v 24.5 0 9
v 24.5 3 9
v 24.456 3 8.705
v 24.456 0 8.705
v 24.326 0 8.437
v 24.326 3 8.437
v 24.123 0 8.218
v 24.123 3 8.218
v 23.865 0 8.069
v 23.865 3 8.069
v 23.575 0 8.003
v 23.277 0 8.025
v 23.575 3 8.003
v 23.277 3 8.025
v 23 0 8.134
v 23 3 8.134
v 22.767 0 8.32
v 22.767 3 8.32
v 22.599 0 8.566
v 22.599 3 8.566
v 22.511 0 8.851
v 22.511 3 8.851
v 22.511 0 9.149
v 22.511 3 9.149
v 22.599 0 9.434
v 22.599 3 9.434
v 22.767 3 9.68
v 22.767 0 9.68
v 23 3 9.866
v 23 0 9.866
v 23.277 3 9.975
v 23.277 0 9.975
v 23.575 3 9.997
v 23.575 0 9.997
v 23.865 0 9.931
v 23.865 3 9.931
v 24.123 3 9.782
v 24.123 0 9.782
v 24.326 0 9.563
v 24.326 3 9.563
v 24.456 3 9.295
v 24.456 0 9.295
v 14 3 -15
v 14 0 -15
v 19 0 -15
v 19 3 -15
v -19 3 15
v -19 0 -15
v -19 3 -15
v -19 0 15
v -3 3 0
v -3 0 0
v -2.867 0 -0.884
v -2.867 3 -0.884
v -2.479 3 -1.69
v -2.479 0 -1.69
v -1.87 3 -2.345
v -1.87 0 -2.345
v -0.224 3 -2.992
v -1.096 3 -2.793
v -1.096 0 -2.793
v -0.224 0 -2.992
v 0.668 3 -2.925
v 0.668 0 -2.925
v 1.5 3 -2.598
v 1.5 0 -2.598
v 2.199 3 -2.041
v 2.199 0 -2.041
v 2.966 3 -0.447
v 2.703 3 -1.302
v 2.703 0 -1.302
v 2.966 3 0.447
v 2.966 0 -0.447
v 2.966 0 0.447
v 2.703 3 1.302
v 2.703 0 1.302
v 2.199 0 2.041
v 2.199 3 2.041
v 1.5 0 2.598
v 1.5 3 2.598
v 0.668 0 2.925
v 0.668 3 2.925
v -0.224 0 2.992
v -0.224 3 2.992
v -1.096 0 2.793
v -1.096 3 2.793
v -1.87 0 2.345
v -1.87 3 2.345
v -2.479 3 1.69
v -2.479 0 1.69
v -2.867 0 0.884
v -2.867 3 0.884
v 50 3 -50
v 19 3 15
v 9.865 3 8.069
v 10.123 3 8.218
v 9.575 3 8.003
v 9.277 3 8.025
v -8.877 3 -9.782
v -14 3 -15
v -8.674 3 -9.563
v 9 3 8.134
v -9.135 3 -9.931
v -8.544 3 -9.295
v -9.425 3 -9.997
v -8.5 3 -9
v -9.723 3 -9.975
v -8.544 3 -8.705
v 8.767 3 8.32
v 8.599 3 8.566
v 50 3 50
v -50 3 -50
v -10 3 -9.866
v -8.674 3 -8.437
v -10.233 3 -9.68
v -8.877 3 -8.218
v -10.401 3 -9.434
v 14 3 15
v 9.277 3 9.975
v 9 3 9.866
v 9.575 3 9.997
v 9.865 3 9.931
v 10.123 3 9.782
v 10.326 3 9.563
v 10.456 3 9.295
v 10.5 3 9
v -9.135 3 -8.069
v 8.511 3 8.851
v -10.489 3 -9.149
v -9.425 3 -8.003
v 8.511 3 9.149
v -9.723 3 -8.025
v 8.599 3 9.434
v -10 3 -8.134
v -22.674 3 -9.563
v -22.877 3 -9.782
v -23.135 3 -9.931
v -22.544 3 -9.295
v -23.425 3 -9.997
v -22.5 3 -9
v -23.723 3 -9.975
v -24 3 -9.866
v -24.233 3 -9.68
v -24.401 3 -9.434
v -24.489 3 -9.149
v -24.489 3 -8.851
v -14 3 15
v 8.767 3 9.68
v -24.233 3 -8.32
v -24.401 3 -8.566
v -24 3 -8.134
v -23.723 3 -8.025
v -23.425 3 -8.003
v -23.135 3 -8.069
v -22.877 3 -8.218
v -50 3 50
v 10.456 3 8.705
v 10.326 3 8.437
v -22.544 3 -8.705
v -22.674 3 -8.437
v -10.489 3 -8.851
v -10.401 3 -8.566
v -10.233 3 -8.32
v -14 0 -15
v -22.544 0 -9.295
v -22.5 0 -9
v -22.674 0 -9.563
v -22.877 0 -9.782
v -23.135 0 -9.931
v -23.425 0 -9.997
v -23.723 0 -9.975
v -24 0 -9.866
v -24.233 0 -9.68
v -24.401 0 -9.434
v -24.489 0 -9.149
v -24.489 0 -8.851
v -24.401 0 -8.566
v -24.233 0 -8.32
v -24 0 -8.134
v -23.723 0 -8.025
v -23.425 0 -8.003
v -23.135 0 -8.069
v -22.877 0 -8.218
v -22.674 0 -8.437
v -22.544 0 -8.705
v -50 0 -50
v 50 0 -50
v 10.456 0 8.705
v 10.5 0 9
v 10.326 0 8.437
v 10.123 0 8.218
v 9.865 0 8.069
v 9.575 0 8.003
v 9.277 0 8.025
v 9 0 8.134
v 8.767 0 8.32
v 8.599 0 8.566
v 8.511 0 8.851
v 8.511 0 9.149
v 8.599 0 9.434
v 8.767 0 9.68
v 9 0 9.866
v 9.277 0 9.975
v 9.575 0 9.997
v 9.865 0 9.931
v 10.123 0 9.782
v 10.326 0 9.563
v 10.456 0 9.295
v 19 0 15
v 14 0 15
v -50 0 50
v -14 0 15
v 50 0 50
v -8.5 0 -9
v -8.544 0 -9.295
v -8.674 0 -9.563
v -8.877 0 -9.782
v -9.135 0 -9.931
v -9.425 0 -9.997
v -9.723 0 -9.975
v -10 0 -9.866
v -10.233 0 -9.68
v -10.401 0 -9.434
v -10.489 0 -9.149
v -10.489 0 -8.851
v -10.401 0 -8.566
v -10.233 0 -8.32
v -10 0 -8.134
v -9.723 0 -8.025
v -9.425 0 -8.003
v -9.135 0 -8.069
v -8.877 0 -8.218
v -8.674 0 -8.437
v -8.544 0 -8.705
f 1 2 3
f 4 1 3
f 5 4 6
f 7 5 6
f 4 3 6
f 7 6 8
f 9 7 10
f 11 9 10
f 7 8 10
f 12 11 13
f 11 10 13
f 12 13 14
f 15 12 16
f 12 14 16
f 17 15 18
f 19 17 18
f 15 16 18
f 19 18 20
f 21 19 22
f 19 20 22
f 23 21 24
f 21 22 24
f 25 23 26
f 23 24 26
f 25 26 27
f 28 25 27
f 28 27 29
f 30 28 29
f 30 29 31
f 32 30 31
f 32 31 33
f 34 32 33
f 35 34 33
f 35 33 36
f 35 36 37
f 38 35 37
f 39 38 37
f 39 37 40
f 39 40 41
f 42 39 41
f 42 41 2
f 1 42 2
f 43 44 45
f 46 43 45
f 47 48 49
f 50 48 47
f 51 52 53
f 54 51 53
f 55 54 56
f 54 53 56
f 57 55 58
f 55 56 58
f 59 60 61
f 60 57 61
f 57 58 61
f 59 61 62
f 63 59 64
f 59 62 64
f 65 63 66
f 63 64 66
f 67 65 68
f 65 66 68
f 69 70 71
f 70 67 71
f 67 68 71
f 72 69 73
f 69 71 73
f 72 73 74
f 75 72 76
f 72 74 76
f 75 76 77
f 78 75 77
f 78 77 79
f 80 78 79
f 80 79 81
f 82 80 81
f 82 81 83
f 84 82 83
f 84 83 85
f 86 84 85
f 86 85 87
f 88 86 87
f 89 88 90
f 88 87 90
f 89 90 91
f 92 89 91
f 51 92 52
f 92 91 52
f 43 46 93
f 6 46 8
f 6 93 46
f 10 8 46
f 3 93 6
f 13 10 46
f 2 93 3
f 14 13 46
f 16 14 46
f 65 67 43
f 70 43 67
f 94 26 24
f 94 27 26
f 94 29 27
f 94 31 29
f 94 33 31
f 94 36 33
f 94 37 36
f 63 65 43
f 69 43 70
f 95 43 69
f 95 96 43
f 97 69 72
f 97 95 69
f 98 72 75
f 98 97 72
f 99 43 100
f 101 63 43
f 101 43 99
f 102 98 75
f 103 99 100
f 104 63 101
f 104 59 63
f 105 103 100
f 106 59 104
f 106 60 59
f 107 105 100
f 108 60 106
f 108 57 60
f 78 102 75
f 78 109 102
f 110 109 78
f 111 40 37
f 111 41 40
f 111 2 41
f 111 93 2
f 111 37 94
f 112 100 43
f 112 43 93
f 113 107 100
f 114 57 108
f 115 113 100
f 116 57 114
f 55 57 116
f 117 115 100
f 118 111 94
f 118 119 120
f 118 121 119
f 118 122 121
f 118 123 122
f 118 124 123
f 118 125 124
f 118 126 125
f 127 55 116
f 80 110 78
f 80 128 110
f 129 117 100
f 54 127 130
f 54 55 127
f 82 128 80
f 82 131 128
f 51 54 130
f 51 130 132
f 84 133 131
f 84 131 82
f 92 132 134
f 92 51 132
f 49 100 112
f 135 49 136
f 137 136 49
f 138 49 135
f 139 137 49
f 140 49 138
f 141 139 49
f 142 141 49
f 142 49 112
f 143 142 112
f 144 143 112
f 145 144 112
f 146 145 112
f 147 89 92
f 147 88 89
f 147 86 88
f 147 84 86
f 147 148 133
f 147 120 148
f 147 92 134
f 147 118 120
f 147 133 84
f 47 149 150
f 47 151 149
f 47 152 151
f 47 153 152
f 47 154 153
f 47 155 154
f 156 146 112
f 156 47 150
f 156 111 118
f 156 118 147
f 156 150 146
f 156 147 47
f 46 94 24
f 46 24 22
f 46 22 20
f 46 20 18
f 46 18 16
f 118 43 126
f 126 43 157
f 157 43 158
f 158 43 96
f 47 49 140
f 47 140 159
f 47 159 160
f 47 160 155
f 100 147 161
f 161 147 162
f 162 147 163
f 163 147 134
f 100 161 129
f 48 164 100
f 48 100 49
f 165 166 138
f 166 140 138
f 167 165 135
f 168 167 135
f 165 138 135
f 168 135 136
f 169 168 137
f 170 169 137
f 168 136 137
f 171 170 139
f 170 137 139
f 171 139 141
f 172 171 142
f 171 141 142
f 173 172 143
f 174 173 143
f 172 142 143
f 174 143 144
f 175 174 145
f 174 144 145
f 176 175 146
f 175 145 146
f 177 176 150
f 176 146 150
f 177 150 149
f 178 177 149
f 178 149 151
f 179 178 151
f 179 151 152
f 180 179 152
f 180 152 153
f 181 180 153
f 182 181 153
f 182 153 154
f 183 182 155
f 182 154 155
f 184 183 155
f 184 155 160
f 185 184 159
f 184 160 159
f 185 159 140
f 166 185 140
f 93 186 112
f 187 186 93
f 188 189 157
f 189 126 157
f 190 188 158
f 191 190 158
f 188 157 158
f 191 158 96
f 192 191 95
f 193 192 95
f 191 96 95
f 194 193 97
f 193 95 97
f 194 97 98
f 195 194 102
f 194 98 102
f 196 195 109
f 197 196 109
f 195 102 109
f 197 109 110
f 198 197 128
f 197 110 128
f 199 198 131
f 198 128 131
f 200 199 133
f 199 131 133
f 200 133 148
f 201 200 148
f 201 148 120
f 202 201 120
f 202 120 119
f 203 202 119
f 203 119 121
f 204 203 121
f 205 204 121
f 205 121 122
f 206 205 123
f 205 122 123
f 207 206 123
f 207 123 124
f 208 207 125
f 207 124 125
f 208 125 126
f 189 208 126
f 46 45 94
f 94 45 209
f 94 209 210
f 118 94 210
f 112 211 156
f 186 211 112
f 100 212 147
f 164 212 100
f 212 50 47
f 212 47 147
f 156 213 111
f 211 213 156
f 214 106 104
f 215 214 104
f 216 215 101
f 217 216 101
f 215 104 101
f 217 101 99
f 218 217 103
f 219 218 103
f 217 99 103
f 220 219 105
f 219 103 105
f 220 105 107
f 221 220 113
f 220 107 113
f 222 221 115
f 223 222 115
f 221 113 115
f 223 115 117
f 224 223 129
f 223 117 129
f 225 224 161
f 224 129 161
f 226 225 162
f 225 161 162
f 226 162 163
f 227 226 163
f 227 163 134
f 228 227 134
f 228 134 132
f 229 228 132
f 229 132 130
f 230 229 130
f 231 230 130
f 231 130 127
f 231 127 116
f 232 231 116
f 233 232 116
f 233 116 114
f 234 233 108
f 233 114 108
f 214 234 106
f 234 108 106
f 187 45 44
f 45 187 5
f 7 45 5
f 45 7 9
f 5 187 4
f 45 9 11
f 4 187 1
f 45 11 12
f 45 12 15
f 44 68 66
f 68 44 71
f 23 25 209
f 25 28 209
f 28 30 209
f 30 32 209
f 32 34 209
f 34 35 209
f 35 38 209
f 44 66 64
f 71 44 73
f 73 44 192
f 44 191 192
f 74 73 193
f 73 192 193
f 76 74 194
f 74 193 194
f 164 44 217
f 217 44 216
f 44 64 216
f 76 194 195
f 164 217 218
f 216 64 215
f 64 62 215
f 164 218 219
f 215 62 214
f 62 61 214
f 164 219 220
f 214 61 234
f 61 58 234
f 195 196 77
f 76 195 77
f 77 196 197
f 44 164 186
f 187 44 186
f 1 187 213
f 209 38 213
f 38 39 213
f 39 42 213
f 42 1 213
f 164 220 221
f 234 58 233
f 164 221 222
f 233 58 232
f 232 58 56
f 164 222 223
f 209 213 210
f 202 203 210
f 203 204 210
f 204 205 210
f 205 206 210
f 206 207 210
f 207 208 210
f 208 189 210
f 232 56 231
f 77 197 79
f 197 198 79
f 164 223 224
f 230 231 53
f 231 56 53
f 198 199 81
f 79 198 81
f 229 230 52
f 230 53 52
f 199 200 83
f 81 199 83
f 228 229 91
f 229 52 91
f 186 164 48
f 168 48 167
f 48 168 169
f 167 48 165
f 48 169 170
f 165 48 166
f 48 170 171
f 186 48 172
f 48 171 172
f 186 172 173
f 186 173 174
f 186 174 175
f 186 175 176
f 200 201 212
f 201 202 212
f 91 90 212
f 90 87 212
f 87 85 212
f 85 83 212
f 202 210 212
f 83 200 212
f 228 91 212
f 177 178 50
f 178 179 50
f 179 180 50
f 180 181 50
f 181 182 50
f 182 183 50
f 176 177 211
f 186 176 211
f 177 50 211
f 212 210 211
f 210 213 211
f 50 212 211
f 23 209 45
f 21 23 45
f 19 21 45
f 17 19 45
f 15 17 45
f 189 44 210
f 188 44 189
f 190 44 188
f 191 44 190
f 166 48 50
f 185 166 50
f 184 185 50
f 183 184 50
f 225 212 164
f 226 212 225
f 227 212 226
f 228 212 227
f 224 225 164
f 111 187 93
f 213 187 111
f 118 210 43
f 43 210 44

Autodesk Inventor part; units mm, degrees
ref_plane "YZ Plane" through (0, 0, 0) normal (1, 0, 0) x (0, 1, 0)
ref_plane "XZ Plane" through (0, 0, 0) normal (0, 1, 0) x (-1, 0, 0)
ref_plane "XY Plane" through (0, 0, 0) normal (0, 0, 1) x (1, 0, 0)
sketch "Sketch1" plane through (0, 0, 0) normal (0, 1, 0) x (-1, 0, 0)
  line L0 (50, -50) -> (-50, -50)
  line L1 (-50, -50) -> (-50, 50)
  line L2 (-50, 50) -> (50, 50)
  line L3 (50, 50) -> (50, -50)
  line L4 (50, -50) -> (-50, 50) construction
  line L5 (-50, -50) -> (50, 50) construction
  line L6 (-14, -15) -> (-19, -15)
  line L7 (-19, -15) -> (-19, 15)
  line L8 (-19, 15) -> (-14, 15)
  line L9 (-14, 15) -> (-14, -15)
  line L10 (-14, -15) -> (-19, 15) construction
  line L11 (-19, -15) -> (-14, 15) construction
  line L12 (0, -50) -> (0, 50) construction
  line L13 (14, -15) -> (19, -15)
  line L14 (19, -15) -> (19, 15)
  line L15 (19, 15) -> (14, 15)
  line L16 (14, 15) -> (14, -15)
  line L17 (14, -15) -> (19, 15) construction
  line L18 (19, -15) -> (14, 15) construction
  line L19 (-19, 15) -> (-19, 50) construction
  line L20 (-19, -15) -> (-19, -50) construction
  circle A0 centre (0, 0) radius 3
  point P0 (-16.5, 0)
  point P1 (16.5, 0)
  dimension "d0" = 100
  dimension "d1" = 100
  dimension "d4" = 5
  dimension "d5" = 30
  dimension "d6" = 14
  dimension "d21" = 6
extrude "Extrusion2" add sketch "Sketch1" along normal blind 3
sketch "Sketch2" plane through (0, 3, 0) normal (0, 1, 0) x (1, 0, 0)
  circle A0 centre (23.5, -9) radius 1
  circle A1 centre (9.5, -9) radius 1
  line L0 (23.5, -9) -> (16.5, -9) construction
  line L1 (19, -15) -> (14, -15) construction
  line L2 (16.5, -15) -> (16.5, -9) construction
  line L3 (16.5, -9) -> (9.5, -9) construction
  line L4 (-19, 15) -> (-14, 15) construction
  line L5 (-16.5, 15) -> (-16.5, 9) construction
  line L6 (-16.5, 9) -> (-9.5, 9) construction
  line L7 (-16.5, 9) -> (-23.5, 9) construction
  circle A2 centre (-9.5, 9) radius 1
  circle A3 centre (-23.5, 9) radius 1
  point P0 (0, 0)
  dimension "d11" = 2
  dimension "d12" = 2
  dimension "d13" = 6
  dimension "d14" = 7
  dimension "d17" = 2
  dimension "d18" = 2
extrude "Extrusion3" cut sketch "Sketch2" against normal through all
properties part number "thumper-bumper-base"
